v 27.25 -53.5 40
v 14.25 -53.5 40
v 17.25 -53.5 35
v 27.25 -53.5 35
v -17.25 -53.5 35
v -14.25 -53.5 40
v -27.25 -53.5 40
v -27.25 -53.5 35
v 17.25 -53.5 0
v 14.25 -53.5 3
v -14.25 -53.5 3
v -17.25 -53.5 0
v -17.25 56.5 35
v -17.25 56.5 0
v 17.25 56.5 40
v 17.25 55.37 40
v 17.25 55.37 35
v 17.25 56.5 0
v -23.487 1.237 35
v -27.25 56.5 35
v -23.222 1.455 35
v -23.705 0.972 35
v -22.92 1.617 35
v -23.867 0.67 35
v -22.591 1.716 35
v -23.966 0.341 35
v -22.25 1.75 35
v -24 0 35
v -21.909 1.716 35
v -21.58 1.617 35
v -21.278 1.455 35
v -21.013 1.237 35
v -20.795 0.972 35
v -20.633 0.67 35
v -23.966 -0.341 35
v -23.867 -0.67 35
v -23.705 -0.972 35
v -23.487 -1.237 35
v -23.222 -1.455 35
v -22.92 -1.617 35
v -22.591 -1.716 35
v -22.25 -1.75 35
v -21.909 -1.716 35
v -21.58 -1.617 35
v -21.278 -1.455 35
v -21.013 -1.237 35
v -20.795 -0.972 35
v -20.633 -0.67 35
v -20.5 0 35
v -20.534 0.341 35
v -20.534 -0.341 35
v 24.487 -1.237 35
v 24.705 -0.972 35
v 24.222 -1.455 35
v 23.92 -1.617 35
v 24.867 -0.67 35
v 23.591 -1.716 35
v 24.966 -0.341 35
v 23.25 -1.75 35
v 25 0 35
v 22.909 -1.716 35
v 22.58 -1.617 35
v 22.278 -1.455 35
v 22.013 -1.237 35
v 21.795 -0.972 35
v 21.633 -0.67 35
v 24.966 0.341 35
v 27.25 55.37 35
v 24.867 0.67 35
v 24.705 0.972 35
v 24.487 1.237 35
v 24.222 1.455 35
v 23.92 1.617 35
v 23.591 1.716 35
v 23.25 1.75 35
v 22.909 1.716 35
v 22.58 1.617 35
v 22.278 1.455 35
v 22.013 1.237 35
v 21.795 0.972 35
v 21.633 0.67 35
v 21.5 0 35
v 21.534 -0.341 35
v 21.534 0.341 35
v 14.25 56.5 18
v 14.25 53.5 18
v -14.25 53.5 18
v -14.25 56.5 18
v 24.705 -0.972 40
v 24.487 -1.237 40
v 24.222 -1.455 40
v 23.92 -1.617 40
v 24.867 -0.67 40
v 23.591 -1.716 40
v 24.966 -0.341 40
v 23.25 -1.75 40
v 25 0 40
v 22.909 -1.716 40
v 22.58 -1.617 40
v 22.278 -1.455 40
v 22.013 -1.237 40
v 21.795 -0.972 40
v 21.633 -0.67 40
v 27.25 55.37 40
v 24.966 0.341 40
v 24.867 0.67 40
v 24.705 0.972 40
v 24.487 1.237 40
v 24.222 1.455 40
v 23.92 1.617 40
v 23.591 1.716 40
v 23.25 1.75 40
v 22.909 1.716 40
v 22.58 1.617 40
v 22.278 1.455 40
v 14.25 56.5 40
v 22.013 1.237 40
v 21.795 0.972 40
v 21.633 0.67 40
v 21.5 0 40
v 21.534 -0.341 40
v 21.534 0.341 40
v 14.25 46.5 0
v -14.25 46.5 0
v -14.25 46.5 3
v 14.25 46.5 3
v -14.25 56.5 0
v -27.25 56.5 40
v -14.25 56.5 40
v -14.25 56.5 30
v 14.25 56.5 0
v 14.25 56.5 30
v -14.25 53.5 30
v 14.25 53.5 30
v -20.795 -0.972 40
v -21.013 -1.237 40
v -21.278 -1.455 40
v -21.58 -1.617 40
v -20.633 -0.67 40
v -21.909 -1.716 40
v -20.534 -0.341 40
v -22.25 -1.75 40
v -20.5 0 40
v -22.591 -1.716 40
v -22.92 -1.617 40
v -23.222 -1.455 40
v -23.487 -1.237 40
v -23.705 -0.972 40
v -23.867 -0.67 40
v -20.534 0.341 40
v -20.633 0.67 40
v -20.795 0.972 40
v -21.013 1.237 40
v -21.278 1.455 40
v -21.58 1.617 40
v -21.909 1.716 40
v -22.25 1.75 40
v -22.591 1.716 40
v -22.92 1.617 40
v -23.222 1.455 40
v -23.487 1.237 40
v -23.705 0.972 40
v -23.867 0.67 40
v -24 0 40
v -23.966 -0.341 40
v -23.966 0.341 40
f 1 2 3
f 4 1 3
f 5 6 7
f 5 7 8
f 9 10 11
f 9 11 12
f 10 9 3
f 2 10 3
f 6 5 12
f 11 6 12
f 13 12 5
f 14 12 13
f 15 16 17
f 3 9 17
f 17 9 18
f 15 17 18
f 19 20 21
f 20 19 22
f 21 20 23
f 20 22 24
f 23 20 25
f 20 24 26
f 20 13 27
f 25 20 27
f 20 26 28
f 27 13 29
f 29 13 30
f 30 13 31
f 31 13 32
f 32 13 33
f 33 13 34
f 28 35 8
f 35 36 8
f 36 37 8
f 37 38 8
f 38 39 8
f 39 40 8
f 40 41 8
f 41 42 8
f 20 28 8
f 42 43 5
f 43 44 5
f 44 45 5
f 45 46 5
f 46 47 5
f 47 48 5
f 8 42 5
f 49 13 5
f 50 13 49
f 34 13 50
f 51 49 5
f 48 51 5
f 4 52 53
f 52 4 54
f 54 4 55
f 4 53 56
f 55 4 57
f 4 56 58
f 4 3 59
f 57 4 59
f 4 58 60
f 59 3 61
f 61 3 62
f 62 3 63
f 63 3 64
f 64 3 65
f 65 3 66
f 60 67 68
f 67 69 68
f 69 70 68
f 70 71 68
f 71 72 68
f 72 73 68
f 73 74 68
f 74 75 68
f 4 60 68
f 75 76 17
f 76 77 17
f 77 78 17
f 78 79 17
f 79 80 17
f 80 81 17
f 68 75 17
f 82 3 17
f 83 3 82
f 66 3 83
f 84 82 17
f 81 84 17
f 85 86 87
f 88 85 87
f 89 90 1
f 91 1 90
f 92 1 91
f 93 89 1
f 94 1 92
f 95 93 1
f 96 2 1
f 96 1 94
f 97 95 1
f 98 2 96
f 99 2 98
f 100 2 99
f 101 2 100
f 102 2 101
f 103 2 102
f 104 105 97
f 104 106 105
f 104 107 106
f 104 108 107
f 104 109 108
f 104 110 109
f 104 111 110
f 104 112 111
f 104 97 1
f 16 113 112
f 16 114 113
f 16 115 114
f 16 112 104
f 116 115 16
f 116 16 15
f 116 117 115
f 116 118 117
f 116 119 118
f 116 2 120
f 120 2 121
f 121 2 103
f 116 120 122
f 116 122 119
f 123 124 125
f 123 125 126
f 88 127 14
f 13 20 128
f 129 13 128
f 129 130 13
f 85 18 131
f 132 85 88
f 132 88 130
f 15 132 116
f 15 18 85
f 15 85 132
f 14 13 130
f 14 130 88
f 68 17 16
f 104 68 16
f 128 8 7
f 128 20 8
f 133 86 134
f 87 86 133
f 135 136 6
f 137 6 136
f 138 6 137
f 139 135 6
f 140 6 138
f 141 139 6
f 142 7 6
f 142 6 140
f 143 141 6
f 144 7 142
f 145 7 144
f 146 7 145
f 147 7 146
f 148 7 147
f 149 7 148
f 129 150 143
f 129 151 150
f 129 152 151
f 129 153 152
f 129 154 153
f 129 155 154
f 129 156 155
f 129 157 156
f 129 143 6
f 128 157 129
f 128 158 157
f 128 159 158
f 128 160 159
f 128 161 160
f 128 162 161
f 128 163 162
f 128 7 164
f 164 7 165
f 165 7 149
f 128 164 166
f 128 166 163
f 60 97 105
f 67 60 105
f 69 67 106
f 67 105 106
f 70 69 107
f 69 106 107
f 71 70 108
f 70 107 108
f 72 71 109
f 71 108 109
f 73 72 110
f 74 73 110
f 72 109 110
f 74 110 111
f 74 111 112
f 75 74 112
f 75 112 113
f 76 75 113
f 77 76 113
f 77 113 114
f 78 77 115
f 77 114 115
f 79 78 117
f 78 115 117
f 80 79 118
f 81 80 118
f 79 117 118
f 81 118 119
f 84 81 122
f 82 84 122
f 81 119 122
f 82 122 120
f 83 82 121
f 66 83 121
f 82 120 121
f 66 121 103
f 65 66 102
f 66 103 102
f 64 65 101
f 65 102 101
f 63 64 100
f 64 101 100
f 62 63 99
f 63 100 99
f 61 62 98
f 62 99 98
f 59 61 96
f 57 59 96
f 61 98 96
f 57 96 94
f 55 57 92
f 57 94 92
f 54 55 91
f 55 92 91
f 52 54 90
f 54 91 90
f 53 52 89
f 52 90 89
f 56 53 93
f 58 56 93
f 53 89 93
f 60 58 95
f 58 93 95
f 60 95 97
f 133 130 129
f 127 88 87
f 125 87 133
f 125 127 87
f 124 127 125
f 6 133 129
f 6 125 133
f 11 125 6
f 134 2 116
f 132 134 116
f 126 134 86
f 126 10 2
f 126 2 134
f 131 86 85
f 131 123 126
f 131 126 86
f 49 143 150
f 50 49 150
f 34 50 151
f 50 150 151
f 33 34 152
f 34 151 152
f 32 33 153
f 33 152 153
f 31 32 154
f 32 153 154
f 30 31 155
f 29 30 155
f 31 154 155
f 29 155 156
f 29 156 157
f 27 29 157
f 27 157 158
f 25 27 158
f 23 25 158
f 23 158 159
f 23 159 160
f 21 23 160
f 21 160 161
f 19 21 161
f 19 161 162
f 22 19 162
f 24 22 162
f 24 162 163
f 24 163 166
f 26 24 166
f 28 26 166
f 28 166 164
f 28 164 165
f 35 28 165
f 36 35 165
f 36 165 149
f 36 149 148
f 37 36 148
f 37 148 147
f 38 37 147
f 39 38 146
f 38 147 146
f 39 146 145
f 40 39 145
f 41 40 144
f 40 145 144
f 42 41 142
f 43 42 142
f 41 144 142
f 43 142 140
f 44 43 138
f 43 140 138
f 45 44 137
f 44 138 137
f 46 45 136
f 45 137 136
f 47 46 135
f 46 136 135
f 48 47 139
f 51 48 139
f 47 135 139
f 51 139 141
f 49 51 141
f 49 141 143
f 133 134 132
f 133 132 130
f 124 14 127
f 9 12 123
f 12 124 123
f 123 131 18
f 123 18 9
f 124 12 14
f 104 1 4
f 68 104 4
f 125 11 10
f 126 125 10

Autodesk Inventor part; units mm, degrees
ref_plane "YZ Plane" through (0, 0, 0) normal (1, 0, 0) x (0, 1, 0)
ref_plane "XZ Plane" through (0, 0, 0) normal (0, 1, 0) x (-1, 0, 0)
ref_plane "XY Plane" through (0, 0, 0) normal (0, 0, 1) x (1, 0, 0)
sketch "Sketch1" plane through (0, 0, 0) normal (0, 0, 1) x (1, 0, 0)
  point P0 (0, 0)
sketch "Sketch2" plane through (0, 0, 0) normal (0, 0, 1) x (1, 0, 0)
  line L0 (-14.25, -53.5) -> (14.25, -53.5)
  line L1 (14.25, -53.5) -> (14.25, 53.5)
  line L2 (14.25, 53.5) -> (-14.25, 53.5)
  line L3 (-14.25, 53.5) -> (-14.25, -53.5)
  line L4 (-14.25, -53.5) -> (14.25, 53.5) construction
  line L5 (14.25, -53.5) -> (-14.25, 53.5) construction
  line L6 (14.25, -53.5) -> (17.25, -53.5)
  line L7 (17.25, -53.5) -> (17.25, 53.5)
  line L8 (17.25, 53.5) -> (14.25, 53.5)
  line L9 (14.25, 53.5) -> (14.25, -53.5)
  line L10 (-14.25, -53.5) -> (-17.25, -53.5)
  line L11 (-17.25, -53.5) -> (-17.25, 53.5)
  line L12 (-17.25, 53.5) -> (-14.25, 53.5)
  line L13 (-14.25, 53.5) -> (-14.25, -53.5)
  line L14 (-17.25, 53.5) -> (17.25, 53.5)
  line L15 (17.25, 53.5) -> (17.25, 56.5)
  line L16 (17.25, 56.5) -> (-17.25, 56.5)
  line L17 (-17.25, 56.5) -> (-17.25, 53.5)
  point P0 (0, 0)
  dimension "d0" = 28.5
  dimension "d1" = 107
  dimension "d2" = 3
  dimension "d3" = 3
  dimension "d4" = 107
  dimension "d5" = 3
extrude "Extrusion1" add sketch "Sketch2" along normal blind 40 contours L10 L11 L12 L3 | L1 L8 L7 L6 | L12 L17 L16 L15 L8 L2
extrude "Extrusion2" add sketch "Sketch2" along normal blind 3 contours L3 L2 L1 L0
ref_plane "Work Plane1" through (-17.25, -53.5, 0) normal (-1, 0, 0) x (0, 0, 1)
sketch "Sketch3" plane through (-17.25, -53.5, 0) normal (-1, 0, 0) x (0, 0, 1)
  line L0 (0, 110) -> (40, 110) projected
  line L1 (0, 0) -> (40, 0) projected
  line L2 (40, 110) -> (35, 110)
  line L3 (35, 110) -> (35, 0)
  line L4 (35, 0) -> (40, 0)
  line L5 (40, 0) -> (40, 110)
  point P0 (0, 53.5)
  dimension "d11" = 5
extrude "Extrusion3" add sketch "Sketch3" along normal blind 10
ref_plane "Work Plane2" through (17.25, -53.5, 0) normal (1, 0, 0) x (0, 0, -1)
sketch "Sketch4" plane through (17.25, -53.5, 0) normal (1, 0, 0) x (0, 0, -1)
  line L0 (-40, 0) -> (-40, 110) projected
  line L1 (-40, 0) -> (-35, 0)
  line L2 (-35, 0) -> (-35, 108.8698)
  line L3 (-35, 108.8698) -> (-40, 108.8698)
  line L4 (-40, 108.8698) -> (-40, 0)
  point P0 (0, 53.5)
  dimension "d15" = 5
extrude "Extrusion4" add sketch "Sketch4" along normal blind 10
ref_plane "Work Plane3" through (-14.25, 53.5, 40) normal (0, -1, 0) x (1, 0, 0)
sketch "Sketch5" plane through (-14.25, 53.5, 40) normal (0, -1, 0) x (1, 0, 0)
  line L0 (0, -37) -> (28.5, -37) projected
  line L1 (28.5, -37) -> (28.5, 0) projected
  line L2 (0, -37) -> (28.5, -37)
  line L3 (28.5, -37) -> (28.5, -22)
  line L4 (28.5, -22) -> (0, -22)
  line L5 (0, -22) -> (0, -37)
  line L6 (31.5, 0) -> (-13, 0) projected
  line L7 (0, 0) -> (28.5, 0)
  line L8 (28.5, 0) -> (28.5, -10)
  line L9 (28.5, -10) -> (0, -10)
  line L10 (0, -10) -> (0, 0)
  point P0 (14.25, -40)
  dimension "d19" = 15
  dimension "d20" = 10
extrude "Extrusion5" cut sketch "Sketch5" against normal blind 10 contours L5 L4 L1 L0
extrude "Extrusion6" cut sketch "Sketch5" against normal blind 10 contours L9 L10 L6 L1
ref_plane "Work Plane4" through (0, 0, 0) normal (0, 0, -1) x (-1, 0, 0)
sketch "Sketch6" plane through (0, 0, 0) normal (0, 0, -1) x (-1, 0, 0)
  line L0 (-14.25, 53.5) -> (-14.25, 56.5) projected
  line L1 (14.25, -53.5) -> (14.25, 56.5) projected
  line L2 (-14.25, 56.5) -> (14.25, 56.5)
  line L3 (14.25, 56.5) -> (14.25, 46.5)
  line L4 (14.25, 46.5) -> (-14.25, 46.5)
  line L5 (-14.25, 46.5) -> (-14.25, 56.5)
  point P0 (0, 0)
  point P1 (14.25, 56.5)
  dimension "d26" = 10
extrude "Extrusion7" cut sketch "Sketch6" against normal blind 10
ref_plane "Work Plane5" through (0, 0, 40) normal (0, 0, 1) x (1, 0, 0)
ref_plane "Work Plane6" through (0, 0, 40) normal (0, 0, 1) x (1, 0, 0)
sketch "Sketch7" plane through (0, 0, 40) normal (0, 0, 1) x (1, 0, 0)
  circle A0 centre (23.25, 0) radius 1.75
  point P0 (0, 0)
  dimension "d31" = 3.5
sketch "Sketch8" plane through (0, 0, 40) normal (0, 0, 1) x (1, 0, 0)
  circle A0 centre (-22.25, 0) radius 1.75
  point P0 (0, 0)
  dimension "d32" = 3.5
extrude "Extrusion8" cut sketch "Sketch8" against normal blind 10
extrude "Extrusion9" cut sketch "Sketch7" against normal blind 10
properties part number "suport_batterie_2"
